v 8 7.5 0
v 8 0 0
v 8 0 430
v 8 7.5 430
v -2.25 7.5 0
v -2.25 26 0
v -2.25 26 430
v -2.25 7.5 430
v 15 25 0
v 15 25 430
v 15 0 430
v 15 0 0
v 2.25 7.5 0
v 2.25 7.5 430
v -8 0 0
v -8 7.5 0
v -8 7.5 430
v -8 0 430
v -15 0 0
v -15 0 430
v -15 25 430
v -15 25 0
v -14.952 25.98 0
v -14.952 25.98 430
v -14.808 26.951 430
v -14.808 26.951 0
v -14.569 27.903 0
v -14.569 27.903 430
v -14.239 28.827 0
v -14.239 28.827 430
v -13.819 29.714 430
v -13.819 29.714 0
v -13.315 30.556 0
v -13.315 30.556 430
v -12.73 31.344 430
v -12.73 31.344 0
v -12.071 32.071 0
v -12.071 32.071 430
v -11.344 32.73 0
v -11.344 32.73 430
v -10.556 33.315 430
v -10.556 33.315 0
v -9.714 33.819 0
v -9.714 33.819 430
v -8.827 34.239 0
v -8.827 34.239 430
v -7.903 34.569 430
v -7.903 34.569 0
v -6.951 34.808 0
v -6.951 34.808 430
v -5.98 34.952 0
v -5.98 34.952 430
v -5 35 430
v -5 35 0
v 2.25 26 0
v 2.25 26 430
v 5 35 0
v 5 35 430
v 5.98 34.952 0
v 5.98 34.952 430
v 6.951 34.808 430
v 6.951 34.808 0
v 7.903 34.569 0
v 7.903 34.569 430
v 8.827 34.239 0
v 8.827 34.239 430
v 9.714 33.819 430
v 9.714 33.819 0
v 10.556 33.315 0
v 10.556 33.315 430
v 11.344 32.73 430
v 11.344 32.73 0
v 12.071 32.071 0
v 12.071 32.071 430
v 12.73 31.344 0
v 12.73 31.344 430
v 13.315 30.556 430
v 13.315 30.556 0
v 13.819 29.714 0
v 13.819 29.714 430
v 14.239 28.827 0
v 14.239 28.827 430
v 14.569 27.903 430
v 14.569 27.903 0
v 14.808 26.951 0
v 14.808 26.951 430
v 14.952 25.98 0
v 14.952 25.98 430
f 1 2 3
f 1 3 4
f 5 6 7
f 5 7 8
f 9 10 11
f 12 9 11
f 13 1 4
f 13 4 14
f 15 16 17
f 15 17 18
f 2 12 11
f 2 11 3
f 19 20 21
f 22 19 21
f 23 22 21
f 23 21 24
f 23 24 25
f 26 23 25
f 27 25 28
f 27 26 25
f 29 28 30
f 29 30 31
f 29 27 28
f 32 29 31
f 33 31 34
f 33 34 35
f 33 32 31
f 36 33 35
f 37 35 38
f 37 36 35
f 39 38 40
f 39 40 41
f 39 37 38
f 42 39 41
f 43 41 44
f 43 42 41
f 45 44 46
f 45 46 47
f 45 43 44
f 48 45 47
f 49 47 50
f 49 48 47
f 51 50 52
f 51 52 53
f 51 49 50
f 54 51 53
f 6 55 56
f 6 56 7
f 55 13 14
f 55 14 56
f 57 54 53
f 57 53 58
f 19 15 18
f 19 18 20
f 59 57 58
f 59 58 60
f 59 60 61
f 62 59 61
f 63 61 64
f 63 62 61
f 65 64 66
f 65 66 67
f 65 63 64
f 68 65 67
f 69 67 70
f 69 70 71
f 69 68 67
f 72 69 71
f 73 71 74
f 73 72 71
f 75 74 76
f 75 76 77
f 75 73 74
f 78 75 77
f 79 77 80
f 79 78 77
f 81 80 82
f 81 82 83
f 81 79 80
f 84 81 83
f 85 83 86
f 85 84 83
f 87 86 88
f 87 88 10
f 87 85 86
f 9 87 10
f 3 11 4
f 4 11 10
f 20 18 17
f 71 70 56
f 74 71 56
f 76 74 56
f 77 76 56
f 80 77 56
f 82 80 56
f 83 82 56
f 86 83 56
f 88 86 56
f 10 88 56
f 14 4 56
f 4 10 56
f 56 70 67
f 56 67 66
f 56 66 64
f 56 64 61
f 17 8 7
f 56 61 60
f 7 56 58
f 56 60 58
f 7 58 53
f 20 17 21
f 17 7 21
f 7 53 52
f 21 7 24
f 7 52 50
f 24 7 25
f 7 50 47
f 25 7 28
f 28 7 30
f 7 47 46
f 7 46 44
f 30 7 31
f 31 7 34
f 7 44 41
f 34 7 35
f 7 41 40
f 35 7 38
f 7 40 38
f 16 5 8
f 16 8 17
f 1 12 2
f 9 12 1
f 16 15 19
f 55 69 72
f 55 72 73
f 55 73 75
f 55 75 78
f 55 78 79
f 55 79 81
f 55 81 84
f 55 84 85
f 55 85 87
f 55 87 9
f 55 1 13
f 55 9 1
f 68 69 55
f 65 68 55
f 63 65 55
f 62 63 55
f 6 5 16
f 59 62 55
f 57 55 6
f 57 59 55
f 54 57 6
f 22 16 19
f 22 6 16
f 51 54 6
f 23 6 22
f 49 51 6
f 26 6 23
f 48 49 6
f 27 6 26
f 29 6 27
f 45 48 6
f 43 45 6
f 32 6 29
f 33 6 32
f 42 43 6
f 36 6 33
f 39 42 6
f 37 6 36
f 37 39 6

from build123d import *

# Parameters (mm, degrees)
BOSS_EXTRU_1_DEPTH = 430


with BuildPart() as part:
    # Esquisse2 → Boss.-Extru.1 (new body)
    with BuildSketch(Plane.XY):
        with BuildLine():
            Line((-15, 0), (-15, 25))
            ThreePointArc((-15, 25), (-12.071067812, 32.071067812), (-5, 35))
            Line((-5, 35), (5, 35))
            ThreePointArc((5, 35), (12.071067812, 32.071067812), (15, 25))
            Line((15, 25), (15, 0))
            Line((15, 0), (8, 0))
            Line((8, 0), (8, 7.5))
            Line((8, 7.5), (2.25, 7.5))
            Line((2.25, 7.5), (2.25, 26))
            Line((2.25, 26), (-2.25, 26))
            Line((-2.25, 26), (-2.25, 7.5))
            Line((-2.25, 7.5), (-8, 7.5))
            Line((-8, 7.5), (-8, 0))
            Line((-8, 0), (-15, 0))
        make_face()
    extrude(amount=BOSS_EXTRU_1_DEPTH)


solid = part.part
